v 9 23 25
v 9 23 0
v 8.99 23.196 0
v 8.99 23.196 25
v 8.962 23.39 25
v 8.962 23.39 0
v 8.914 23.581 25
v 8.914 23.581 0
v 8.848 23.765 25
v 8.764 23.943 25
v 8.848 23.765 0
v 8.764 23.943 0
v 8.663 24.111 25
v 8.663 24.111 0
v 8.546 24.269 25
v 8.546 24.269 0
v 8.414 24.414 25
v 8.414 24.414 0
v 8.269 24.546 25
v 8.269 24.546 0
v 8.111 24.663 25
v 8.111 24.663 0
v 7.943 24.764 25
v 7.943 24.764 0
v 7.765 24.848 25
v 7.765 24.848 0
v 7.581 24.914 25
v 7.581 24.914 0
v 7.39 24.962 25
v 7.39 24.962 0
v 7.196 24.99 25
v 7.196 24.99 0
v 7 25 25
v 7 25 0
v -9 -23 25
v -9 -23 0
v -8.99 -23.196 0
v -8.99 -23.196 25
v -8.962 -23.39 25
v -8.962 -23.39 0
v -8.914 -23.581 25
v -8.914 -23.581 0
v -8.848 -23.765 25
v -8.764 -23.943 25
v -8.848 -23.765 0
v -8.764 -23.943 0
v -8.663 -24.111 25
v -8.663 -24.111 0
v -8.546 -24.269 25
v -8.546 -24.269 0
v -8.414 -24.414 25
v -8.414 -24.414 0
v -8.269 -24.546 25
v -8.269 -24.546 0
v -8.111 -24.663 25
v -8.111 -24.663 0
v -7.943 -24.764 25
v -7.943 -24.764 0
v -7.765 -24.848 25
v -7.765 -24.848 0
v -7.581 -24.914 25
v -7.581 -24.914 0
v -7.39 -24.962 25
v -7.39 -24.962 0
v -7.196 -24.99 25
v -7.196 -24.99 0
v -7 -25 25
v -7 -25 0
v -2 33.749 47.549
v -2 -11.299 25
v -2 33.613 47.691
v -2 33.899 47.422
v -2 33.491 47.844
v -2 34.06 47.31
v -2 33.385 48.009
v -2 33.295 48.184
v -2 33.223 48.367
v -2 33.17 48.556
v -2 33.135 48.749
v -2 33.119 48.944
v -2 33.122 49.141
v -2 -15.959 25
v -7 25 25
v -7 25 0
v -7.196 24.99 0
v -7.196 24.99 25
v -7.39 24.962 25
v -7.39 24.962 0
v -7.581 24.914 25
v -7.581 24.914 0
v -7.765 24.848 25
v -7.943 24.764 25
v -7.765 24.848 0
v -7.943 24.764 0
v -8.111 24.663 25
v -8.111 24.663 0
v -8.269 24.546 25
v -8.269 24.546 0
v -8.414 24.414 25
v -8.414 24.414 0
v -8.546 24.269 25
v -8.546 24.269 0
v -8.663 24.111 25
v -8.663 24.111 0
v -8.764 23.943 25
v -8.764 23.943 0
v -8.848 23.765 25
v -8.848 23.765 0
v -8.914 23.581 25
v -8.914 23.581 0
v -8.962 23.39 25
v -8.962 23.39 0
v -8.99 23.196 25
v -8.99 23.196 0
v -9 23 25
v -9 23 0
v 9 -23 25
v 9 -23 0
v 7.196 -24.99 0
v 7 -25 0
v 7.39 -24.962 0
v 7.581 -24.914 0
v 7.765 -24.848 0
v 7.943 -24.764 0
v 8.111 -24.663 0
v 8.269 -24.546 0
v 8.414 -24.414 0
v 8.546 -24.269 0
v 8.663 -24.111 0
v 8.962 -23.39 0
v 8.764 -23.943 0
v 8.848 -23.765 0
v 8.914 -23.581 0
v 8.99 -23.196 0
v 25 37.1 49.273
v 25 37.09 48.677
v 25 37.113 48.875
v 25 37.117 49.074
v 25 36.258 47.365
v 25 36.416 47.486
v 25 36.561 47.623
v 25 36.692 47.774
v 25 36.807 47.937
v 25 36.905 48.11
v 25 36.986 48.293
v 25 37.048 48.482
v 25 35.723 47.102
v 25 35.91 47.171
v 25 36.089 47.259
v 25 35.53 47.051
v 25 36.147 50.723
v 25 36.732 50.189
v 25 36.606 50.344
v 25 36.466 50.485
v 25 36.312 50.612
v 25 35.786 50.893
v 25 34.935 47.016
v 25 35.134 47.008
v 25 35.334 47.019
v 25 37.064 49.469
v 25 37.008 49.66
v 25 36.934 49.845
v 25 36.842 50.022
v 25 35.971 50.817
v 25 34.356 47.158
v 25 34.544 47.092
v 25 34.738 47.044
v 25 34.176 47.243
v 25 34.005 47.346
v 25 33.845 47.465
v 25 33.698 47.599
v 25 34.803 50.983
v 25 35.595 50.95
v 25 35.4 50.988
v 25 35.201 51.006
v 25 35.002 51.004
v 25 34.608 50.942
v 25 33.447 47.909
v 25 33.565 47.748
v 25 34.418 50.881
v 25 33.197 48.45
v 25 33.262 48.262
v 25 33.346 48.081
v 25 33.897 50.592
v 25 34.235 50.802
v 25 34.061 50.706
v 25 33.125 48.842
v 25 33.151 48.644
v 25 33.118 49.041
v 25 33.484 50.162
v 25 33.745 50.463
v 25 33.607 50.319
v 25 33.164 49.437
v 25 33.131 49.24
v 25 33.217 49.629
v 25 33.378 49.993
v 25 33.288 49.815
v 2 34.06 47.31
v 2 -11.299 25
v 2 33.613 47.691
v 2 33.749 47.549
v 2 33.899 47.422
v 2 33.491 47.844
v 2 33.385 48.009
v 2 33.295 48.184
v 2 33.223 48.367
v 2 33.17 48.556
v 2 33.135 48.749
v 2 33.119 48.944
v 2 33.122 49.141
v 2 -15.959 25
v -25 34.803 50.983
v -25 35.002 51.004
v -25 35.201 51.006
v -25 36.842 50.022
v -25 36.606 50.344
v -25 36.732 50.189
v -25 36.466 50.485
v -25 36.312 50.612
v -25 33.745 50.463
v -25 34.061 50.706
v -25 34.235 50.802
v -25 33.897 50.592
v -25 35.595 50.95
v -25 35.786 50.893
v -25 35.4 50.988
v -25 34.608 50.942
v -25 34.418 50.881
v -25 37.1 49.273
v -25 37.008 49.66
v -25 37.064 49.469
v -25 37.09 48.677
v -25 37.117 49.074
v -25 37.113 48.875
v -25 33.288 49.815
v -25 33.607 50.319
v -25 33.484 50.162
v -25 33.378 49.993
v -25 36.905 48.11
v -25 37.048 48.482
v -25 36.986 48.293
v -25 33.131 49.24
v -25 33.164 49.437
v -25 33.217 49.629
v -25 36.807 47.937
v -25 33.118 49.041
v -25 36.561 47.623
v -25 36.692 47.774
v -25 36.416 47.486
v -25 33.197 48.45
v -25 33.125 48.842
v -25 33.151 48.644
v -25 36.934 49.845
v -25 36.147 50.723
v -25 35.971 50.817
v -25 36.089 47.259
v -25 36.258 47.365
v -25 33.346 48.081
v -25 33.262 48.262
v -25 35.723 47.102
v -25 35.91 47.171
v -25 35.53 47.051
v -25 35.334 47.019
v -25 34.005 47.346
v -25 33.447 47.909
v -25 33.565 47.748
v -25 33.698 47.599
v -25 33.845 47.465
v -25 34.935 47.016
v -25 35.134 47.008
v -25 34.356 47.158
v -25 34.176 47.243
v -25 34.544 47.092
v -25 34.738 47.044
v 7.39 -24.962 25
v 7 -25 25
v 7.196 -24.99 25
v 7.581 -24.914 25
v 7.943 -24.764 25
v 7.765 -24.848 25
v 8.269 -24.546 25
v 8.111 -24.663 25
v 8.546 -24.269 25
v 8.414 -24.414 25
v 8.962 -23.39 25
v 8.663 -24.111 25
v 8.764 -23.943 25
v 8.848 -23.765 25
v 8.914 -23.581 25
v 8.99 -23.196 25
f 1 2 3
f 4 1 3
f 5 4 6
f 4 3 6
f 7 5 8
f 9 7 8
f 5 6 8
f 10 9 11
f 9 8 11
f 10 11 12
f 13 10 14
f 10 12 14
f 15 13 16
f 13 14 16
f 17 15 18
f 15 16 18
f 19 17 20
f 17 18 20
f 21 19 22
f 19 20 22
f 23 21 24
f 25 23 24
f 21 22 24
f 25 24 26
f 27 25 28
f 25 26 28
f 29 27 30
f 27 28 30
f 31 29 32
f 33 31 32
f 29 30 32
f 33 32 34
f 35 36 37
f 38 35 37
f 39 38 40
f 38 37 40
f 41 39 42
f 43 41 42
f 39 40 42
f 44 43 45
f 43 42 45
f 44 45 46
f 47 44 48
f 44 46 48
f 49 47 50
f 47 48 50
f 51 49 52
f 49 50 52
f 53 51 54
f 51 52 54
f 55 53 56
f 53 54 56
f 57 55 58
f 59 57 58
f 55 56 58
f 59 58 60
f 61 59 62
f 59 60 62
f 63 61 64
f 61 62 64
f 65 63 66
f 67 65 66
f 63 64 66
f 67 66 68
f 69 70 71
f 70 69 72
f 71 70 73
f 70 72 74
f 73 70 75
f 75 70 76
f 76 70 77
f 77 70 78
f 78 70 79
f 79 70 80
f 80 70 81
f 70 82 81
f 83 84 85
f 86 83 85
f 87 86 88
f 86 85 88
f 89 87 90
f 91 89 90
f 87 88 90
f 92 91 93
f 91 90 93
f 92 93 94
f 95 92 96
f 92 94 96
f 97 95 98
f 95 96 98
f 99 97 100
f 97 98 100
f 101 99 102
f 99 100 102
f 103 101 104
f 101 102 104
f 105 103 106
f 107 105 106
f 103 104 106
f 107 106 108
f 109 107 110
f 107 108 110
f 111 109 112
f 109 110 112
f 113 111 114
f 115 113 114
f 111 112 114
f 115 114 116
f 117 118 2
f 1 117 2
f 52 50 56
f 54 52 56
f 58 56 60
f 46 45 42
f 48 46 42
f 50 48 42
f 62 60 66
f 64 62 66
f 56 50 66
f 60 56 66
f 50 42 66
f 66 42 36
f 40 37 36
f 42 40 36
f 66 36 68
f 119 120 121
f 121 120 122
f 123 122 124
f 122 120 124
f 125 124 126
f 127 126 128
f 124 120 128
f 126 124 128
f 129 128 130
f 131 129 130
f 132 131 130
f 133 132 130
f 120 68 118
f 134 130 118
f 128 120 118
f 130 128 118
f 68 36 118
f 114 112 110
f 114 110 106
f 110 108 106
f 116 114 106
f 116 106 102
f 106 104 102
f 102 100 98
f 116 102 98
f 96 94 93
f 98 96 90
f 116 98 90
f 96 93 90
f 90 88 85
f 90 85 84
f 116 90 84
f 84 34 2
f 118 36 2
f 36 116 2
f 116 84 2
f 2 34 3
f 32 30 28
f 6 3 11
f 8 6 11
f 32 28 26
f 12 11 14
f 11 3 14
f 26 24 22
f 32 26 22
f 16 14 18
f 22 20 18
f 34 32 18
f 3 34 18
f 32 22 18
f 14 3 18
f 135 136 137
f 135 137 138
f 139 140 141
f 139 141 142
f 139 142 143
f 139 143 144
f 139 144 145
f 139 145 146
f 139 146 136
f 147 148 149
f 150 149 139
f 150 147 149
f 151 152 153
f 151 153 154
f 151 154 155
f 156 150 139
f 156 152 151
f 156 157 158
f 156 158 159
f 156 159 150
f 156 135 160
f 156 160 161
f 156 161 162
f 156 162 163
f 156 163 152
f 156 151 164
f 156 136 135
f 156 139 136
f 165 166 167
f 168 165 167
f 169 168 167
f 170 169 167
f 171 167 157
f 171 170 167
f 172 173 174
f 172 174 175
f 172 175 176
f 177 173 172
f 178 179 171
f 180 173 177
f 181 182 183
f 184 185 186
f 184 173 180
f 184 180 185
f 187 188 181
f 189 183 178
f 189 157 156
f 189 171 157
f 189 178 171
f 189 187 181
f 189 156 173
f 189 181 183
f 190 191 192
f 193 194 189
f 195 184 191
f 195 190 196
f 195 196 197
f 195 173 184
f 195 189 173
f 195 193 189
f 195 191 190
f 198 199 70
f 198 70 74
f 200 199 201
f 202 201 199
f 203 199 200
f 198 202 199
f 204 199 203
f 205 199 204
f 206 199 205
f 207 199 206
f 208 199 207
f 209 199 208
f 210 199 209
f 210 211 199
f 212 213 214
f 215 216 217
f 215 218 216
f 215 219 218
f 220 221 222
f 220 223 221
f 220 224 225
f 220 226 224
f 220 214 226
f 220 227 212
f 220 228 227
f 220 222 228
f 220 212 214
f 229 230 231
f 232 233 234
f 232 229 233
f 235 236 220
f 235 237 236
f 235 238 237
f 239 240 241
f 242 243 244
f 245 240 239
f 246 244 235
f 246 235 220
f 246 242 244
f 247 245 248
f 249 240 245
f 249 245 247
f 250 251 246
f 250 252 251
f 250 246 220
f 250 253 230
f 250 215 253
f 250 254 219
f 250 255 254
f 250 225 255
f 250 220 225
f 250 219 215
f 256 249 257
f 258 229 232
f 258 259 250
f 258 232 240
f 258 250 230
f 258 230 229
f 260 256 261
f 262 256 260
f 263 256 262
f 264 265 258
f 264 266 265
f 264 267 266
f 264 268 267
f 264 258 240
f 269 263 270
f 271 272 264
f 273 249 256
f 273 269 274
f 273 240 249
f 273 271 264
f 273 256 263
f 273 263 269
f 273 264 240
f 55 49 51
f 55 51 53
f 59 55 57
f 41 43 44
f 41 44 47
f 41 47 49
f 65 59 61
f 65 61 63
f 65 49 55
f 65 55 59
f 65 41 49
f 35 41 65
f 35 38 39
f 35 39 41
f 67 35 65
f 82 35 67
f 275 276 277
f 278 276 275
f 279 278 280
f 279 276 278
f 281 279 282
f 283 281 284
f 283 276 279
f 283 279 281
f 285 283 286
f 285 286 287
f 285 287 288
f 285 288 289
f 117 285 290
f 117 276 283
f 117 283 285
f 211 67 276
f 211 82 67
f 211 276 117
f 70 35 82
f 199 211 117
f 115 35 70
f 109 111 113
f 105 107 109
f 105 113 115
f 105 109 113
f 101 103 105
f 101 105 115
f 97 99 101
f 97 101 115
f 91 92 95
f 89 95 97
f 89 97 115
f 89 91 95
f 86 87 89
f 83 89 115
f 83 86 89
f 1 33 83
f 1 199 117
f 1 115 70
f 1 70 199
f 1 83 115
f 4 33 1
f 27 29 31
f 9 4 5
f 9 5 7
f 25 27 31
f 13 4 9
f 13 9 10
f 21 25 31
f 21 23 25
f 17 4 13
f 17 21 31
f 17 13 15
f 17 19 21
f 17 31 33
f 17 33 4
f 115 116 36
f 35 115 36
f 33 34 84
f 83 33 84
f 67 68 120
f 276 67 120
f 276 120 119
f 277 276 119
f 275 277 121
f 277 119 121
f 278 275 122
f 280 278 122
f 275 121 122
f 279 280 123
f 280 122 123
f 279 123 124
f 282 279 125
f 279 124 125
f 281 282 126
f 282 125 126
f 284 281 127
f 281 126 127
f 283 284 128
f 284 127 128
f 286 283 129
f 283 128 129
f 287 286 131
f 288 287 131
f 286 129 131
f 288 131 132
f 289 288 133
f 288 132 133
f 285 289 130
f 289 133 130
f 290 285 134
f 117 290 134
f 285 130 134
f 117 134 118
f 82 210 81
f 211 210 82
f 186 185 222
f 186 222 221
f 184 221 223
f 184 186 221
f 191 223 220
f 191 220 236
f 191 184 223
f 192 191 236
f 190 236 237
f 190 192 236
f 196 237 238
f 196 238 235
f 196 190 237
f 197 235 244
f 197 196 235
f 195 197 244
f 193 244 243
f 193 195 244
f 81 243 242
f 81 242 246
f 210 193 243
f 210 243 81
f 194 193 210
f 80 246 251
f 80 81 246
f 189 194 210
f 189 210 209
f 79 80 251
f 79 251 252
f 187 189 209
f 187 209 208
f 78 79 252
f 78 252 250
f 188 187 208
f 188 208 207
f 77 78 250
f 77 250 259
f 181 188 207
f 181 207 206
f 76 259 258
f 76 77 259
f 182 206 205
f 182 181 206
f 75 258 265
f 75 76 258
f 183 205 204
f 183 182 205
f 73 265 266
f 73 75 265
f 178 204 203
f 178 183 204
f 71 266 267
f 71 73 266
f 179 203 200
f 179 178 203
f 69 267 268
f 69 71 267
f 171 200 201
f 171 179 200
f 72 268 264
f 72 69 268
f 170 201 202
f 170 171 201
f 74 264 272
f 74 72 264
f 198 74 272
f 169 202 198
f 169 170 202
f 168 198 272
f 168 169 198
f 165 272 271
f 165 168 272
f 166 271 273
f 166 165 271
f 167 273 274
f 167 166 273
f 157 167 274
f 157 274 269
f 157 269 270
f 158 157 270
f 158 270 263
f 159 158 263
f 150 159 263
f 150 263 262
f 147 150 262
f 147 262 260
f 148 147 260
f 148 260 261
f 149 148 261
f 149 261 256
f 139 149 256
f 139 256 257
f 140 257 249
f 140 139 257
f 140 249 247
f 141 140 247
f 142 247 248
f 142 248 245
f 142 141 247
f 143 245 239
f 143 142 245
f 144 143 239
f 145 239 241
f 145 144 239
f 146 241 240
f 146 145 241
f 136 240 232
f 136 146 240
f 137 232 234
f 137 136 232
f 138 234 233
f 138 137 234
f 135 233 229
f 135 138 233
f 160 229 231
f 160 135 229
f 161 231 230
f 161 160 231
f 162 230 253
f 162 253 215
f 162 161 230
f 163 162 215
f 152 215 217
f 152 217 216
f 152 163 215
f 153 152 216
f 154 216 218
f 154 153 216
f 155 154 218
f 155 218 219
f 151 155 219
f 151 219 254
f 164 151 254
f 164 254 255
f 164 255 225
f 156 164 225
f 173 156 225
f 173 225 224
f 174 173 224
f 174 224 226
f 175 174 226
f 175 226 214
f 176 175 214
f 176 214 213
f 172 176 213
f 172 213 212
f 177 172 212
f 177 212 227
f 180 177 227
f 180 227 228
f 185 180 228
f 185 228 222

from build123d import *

# Parameters (mm, degrees)
F1_DEPTH = 25
F3_START = -7
F3_DEPTH = 4
F4_W     = 4
F4_H     = 1


with BuildPart() as f1:
    # F0 (on Top) → F1 (new body)
    with BuildSketch(Plane.XY):
        with BuildLine():
            Line((-7, -25), (7, -25))
            ThreePointArc((7, -25), (8.4142135624, -24.4142135624), (9, -23))
            Line((9, -23), (9, 23))
            ThreePointArc((9, 23), (8.4142135624, 24.4142135624), (7, 25))
            Line((7, 25), (-7, 25))
            ThreePointArc((-7, 25), (-8.4142135624, 24.4142135624), (-9, 23))
            Line((-9, 23), (-9, -23))
            ThreePointArc((-9, -23), (-8.4142135624, -24.4142135624), (-7, -25))
        make_face()
    extrude(amount=F1_DEPTH)

    # F2 (on face) → F3 (join)
    with BuildSketch(Plane.YZ.offset(9).offset(F3_START)):
        Polygon((34.6765182912, 49.9050952494), (-15.9586127847, 25), (-11.2994632265, 25), (35.5840993399, 48.0598710132), align=None)
    extrude(amount=-F3_DEPTH)

    # F4 (on face) → F5 (revolve)
    with BuildSketch(Plane(origin=(0, 47.6862617378, 23.4546818668), x_dir=(-1, 0, 0), z_dir=(0, 0.8973319166, 0.4413563543))):
        with Locations((0, 28.976733073)):
            Rectangle(F4_W, F4_H)
        Polygon((2, 28.476733073), (25, 28.476733073), (25, 30.476733073), (-25, 30.476733073), (-25, 28.476733073), (-2, 28.476733073), (-2, 29.476733073), (2, 29.476733073), align=None)
    revolve(axis=Axis((0, 35.1178746456, 49.0077633328), (1, 0, 0)))


solid = f1.part
